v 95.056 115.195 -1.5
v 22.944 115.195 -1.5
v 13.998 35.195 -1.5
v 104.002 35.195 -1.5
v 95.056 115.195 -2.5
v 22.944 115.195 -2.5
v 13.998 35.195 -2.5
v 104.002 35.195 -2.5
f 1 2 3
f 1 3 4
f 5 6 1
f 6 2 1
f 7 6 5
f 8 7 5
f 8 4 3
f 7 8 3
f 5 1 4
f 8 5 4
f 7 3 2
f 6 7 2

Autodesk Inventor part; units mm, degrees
ref_plane "YZ Plane" through (0, 0, 0) normal (1, 0, 0) x (0, 1, 0)
ref_plane "XZ Plane" through (0, 0, 0) normal (0, 1, 0) x (-1, 0, 0)
ref_plane "XY Plane" through (0, 0, 0) normal (0, 0, 1) x (1, 0, 0)
sketch "Sketch1" plane through (0, 0, 0) normal (0, 0, 1) x (1, 0, 0)
  line L0 (0, 0) -> (14, 125.1947)
  line L1 (14, 125.1947) -> (104, 125.1947)
  line L2 (104, 125.1947) -> (118, 0)
  line L3 (16, 0) -> (28, 0)
  line L4 (28, 0) -> (28, -4)
  line L5 (28, -4) -> (16, -4)
  line L6 (16, -4) -> (16, 0)
  line L7 (66, 0) -> (78, 0)
  line L8 (78, 0) -> (78, -4)
  line L9 (78, -4) -> (66, -4)
  line L10 (66, -4) -> (66, 0)
  line L11 (40, 0) -> (52, 0)
  line L12 (52, 0) -> (52, -4)
  line L13 (52, -4) -> (40, -4)
  line L14 (40, -4) -> (40, 0)
  line L15 (90, 0) -> (102, 0)
  line L16 (102, 0) -> (102, -4)
  line L17 (102, -4) -> (90, -4)
  line L18 (90, -4) -> (90, 0)
  line L19 (78, 0) -> (90, 0)
  line L20 (28, 0) -> (40, 0)
  line L21 (102, 0) -> (118, 0)
  line L22 (16, 0) -> (0, 0)
  line L23 (52, 0) -> (66, 0)
  line L24 (102, -4) -> (118.4473, -4)
  line L25 (118.4473, -4) -> (118, 0)
  dimension "d229" = 90
  dimension "d232" = 16
  dimension "d233" = 12
  dimension "d234" = 12
  dimension "d235" = 4
  dimension "d239" = 14
  dimension "d241" = 130
extrude "Extrusion1" add sketch "Sketch1" against normal blind 4 contours L0 L1 L2 L21 L15 L19 L7 L23 L11 L20 L3 L22 | L3 L4 L5 L6 | L11 L12 L13 L14 | L16 L17 L18 L15 | L7 L8 L9 L10
sketch "Sketch2" plane through (0, 0, 0) normal (0, 0, 1) x (1, 0, 0)
  line L0 (9, 25) -> (109, 25)
  line L1 (109, 25) -> (109, 8)
  line L2 (109, 8) -> (9, 8)
  line L3 (9, 8) -> (9, 25)
  line L4 (22.9441, 115.1947) -> (95.0559, 115.1947)
  line L5 (95.0559, 115.1947) -> (104.002, 35.1947)
  line L6 (104.002, 35.1947) -> (13.998, 35.1947)
  line L7 (13.998, 35.1947) -> (22.9441, 115.1947)
  line L8 (118, 0) -> (104, 125.1947) projected
  line L9 (14, 125.1947) -> (0, 0) projected
  line L10 (104, 125.1947) -> (14, 125.1947) projected
  line L11 (59, 125.1947) -> (59, 0)
  line L12 (52, 0) -> (66, 0) projected
  dimension "d242" = 100
  dimension "d243" = 17
  dimension "d245" = 8
  dimension "d246" = 10
  dimension "d247" = 80
  dimension "d249" = 10
extrude "Extrusion2" cut sketch "Sketch2" against normal blind 4
extrude "Extrusion3" add sketch "Sketch2" against normal blind 2.5 contours L6 L7 L4 L11 | L11 L4 L5 L6
extrude "Extrusion4" cut sketch "Sketch2" against normal blind 1.5 contours L6 L7 L4 L11 | L11 L4 L5 L6
extrude "Extrusion5" cut sketch "Sketch2" against normal blind 2.5 contours L6 L7 L4 L11 | L11 L4 L5 L6 keep common part
properties part number "Langbektang houder" material "Glass"
